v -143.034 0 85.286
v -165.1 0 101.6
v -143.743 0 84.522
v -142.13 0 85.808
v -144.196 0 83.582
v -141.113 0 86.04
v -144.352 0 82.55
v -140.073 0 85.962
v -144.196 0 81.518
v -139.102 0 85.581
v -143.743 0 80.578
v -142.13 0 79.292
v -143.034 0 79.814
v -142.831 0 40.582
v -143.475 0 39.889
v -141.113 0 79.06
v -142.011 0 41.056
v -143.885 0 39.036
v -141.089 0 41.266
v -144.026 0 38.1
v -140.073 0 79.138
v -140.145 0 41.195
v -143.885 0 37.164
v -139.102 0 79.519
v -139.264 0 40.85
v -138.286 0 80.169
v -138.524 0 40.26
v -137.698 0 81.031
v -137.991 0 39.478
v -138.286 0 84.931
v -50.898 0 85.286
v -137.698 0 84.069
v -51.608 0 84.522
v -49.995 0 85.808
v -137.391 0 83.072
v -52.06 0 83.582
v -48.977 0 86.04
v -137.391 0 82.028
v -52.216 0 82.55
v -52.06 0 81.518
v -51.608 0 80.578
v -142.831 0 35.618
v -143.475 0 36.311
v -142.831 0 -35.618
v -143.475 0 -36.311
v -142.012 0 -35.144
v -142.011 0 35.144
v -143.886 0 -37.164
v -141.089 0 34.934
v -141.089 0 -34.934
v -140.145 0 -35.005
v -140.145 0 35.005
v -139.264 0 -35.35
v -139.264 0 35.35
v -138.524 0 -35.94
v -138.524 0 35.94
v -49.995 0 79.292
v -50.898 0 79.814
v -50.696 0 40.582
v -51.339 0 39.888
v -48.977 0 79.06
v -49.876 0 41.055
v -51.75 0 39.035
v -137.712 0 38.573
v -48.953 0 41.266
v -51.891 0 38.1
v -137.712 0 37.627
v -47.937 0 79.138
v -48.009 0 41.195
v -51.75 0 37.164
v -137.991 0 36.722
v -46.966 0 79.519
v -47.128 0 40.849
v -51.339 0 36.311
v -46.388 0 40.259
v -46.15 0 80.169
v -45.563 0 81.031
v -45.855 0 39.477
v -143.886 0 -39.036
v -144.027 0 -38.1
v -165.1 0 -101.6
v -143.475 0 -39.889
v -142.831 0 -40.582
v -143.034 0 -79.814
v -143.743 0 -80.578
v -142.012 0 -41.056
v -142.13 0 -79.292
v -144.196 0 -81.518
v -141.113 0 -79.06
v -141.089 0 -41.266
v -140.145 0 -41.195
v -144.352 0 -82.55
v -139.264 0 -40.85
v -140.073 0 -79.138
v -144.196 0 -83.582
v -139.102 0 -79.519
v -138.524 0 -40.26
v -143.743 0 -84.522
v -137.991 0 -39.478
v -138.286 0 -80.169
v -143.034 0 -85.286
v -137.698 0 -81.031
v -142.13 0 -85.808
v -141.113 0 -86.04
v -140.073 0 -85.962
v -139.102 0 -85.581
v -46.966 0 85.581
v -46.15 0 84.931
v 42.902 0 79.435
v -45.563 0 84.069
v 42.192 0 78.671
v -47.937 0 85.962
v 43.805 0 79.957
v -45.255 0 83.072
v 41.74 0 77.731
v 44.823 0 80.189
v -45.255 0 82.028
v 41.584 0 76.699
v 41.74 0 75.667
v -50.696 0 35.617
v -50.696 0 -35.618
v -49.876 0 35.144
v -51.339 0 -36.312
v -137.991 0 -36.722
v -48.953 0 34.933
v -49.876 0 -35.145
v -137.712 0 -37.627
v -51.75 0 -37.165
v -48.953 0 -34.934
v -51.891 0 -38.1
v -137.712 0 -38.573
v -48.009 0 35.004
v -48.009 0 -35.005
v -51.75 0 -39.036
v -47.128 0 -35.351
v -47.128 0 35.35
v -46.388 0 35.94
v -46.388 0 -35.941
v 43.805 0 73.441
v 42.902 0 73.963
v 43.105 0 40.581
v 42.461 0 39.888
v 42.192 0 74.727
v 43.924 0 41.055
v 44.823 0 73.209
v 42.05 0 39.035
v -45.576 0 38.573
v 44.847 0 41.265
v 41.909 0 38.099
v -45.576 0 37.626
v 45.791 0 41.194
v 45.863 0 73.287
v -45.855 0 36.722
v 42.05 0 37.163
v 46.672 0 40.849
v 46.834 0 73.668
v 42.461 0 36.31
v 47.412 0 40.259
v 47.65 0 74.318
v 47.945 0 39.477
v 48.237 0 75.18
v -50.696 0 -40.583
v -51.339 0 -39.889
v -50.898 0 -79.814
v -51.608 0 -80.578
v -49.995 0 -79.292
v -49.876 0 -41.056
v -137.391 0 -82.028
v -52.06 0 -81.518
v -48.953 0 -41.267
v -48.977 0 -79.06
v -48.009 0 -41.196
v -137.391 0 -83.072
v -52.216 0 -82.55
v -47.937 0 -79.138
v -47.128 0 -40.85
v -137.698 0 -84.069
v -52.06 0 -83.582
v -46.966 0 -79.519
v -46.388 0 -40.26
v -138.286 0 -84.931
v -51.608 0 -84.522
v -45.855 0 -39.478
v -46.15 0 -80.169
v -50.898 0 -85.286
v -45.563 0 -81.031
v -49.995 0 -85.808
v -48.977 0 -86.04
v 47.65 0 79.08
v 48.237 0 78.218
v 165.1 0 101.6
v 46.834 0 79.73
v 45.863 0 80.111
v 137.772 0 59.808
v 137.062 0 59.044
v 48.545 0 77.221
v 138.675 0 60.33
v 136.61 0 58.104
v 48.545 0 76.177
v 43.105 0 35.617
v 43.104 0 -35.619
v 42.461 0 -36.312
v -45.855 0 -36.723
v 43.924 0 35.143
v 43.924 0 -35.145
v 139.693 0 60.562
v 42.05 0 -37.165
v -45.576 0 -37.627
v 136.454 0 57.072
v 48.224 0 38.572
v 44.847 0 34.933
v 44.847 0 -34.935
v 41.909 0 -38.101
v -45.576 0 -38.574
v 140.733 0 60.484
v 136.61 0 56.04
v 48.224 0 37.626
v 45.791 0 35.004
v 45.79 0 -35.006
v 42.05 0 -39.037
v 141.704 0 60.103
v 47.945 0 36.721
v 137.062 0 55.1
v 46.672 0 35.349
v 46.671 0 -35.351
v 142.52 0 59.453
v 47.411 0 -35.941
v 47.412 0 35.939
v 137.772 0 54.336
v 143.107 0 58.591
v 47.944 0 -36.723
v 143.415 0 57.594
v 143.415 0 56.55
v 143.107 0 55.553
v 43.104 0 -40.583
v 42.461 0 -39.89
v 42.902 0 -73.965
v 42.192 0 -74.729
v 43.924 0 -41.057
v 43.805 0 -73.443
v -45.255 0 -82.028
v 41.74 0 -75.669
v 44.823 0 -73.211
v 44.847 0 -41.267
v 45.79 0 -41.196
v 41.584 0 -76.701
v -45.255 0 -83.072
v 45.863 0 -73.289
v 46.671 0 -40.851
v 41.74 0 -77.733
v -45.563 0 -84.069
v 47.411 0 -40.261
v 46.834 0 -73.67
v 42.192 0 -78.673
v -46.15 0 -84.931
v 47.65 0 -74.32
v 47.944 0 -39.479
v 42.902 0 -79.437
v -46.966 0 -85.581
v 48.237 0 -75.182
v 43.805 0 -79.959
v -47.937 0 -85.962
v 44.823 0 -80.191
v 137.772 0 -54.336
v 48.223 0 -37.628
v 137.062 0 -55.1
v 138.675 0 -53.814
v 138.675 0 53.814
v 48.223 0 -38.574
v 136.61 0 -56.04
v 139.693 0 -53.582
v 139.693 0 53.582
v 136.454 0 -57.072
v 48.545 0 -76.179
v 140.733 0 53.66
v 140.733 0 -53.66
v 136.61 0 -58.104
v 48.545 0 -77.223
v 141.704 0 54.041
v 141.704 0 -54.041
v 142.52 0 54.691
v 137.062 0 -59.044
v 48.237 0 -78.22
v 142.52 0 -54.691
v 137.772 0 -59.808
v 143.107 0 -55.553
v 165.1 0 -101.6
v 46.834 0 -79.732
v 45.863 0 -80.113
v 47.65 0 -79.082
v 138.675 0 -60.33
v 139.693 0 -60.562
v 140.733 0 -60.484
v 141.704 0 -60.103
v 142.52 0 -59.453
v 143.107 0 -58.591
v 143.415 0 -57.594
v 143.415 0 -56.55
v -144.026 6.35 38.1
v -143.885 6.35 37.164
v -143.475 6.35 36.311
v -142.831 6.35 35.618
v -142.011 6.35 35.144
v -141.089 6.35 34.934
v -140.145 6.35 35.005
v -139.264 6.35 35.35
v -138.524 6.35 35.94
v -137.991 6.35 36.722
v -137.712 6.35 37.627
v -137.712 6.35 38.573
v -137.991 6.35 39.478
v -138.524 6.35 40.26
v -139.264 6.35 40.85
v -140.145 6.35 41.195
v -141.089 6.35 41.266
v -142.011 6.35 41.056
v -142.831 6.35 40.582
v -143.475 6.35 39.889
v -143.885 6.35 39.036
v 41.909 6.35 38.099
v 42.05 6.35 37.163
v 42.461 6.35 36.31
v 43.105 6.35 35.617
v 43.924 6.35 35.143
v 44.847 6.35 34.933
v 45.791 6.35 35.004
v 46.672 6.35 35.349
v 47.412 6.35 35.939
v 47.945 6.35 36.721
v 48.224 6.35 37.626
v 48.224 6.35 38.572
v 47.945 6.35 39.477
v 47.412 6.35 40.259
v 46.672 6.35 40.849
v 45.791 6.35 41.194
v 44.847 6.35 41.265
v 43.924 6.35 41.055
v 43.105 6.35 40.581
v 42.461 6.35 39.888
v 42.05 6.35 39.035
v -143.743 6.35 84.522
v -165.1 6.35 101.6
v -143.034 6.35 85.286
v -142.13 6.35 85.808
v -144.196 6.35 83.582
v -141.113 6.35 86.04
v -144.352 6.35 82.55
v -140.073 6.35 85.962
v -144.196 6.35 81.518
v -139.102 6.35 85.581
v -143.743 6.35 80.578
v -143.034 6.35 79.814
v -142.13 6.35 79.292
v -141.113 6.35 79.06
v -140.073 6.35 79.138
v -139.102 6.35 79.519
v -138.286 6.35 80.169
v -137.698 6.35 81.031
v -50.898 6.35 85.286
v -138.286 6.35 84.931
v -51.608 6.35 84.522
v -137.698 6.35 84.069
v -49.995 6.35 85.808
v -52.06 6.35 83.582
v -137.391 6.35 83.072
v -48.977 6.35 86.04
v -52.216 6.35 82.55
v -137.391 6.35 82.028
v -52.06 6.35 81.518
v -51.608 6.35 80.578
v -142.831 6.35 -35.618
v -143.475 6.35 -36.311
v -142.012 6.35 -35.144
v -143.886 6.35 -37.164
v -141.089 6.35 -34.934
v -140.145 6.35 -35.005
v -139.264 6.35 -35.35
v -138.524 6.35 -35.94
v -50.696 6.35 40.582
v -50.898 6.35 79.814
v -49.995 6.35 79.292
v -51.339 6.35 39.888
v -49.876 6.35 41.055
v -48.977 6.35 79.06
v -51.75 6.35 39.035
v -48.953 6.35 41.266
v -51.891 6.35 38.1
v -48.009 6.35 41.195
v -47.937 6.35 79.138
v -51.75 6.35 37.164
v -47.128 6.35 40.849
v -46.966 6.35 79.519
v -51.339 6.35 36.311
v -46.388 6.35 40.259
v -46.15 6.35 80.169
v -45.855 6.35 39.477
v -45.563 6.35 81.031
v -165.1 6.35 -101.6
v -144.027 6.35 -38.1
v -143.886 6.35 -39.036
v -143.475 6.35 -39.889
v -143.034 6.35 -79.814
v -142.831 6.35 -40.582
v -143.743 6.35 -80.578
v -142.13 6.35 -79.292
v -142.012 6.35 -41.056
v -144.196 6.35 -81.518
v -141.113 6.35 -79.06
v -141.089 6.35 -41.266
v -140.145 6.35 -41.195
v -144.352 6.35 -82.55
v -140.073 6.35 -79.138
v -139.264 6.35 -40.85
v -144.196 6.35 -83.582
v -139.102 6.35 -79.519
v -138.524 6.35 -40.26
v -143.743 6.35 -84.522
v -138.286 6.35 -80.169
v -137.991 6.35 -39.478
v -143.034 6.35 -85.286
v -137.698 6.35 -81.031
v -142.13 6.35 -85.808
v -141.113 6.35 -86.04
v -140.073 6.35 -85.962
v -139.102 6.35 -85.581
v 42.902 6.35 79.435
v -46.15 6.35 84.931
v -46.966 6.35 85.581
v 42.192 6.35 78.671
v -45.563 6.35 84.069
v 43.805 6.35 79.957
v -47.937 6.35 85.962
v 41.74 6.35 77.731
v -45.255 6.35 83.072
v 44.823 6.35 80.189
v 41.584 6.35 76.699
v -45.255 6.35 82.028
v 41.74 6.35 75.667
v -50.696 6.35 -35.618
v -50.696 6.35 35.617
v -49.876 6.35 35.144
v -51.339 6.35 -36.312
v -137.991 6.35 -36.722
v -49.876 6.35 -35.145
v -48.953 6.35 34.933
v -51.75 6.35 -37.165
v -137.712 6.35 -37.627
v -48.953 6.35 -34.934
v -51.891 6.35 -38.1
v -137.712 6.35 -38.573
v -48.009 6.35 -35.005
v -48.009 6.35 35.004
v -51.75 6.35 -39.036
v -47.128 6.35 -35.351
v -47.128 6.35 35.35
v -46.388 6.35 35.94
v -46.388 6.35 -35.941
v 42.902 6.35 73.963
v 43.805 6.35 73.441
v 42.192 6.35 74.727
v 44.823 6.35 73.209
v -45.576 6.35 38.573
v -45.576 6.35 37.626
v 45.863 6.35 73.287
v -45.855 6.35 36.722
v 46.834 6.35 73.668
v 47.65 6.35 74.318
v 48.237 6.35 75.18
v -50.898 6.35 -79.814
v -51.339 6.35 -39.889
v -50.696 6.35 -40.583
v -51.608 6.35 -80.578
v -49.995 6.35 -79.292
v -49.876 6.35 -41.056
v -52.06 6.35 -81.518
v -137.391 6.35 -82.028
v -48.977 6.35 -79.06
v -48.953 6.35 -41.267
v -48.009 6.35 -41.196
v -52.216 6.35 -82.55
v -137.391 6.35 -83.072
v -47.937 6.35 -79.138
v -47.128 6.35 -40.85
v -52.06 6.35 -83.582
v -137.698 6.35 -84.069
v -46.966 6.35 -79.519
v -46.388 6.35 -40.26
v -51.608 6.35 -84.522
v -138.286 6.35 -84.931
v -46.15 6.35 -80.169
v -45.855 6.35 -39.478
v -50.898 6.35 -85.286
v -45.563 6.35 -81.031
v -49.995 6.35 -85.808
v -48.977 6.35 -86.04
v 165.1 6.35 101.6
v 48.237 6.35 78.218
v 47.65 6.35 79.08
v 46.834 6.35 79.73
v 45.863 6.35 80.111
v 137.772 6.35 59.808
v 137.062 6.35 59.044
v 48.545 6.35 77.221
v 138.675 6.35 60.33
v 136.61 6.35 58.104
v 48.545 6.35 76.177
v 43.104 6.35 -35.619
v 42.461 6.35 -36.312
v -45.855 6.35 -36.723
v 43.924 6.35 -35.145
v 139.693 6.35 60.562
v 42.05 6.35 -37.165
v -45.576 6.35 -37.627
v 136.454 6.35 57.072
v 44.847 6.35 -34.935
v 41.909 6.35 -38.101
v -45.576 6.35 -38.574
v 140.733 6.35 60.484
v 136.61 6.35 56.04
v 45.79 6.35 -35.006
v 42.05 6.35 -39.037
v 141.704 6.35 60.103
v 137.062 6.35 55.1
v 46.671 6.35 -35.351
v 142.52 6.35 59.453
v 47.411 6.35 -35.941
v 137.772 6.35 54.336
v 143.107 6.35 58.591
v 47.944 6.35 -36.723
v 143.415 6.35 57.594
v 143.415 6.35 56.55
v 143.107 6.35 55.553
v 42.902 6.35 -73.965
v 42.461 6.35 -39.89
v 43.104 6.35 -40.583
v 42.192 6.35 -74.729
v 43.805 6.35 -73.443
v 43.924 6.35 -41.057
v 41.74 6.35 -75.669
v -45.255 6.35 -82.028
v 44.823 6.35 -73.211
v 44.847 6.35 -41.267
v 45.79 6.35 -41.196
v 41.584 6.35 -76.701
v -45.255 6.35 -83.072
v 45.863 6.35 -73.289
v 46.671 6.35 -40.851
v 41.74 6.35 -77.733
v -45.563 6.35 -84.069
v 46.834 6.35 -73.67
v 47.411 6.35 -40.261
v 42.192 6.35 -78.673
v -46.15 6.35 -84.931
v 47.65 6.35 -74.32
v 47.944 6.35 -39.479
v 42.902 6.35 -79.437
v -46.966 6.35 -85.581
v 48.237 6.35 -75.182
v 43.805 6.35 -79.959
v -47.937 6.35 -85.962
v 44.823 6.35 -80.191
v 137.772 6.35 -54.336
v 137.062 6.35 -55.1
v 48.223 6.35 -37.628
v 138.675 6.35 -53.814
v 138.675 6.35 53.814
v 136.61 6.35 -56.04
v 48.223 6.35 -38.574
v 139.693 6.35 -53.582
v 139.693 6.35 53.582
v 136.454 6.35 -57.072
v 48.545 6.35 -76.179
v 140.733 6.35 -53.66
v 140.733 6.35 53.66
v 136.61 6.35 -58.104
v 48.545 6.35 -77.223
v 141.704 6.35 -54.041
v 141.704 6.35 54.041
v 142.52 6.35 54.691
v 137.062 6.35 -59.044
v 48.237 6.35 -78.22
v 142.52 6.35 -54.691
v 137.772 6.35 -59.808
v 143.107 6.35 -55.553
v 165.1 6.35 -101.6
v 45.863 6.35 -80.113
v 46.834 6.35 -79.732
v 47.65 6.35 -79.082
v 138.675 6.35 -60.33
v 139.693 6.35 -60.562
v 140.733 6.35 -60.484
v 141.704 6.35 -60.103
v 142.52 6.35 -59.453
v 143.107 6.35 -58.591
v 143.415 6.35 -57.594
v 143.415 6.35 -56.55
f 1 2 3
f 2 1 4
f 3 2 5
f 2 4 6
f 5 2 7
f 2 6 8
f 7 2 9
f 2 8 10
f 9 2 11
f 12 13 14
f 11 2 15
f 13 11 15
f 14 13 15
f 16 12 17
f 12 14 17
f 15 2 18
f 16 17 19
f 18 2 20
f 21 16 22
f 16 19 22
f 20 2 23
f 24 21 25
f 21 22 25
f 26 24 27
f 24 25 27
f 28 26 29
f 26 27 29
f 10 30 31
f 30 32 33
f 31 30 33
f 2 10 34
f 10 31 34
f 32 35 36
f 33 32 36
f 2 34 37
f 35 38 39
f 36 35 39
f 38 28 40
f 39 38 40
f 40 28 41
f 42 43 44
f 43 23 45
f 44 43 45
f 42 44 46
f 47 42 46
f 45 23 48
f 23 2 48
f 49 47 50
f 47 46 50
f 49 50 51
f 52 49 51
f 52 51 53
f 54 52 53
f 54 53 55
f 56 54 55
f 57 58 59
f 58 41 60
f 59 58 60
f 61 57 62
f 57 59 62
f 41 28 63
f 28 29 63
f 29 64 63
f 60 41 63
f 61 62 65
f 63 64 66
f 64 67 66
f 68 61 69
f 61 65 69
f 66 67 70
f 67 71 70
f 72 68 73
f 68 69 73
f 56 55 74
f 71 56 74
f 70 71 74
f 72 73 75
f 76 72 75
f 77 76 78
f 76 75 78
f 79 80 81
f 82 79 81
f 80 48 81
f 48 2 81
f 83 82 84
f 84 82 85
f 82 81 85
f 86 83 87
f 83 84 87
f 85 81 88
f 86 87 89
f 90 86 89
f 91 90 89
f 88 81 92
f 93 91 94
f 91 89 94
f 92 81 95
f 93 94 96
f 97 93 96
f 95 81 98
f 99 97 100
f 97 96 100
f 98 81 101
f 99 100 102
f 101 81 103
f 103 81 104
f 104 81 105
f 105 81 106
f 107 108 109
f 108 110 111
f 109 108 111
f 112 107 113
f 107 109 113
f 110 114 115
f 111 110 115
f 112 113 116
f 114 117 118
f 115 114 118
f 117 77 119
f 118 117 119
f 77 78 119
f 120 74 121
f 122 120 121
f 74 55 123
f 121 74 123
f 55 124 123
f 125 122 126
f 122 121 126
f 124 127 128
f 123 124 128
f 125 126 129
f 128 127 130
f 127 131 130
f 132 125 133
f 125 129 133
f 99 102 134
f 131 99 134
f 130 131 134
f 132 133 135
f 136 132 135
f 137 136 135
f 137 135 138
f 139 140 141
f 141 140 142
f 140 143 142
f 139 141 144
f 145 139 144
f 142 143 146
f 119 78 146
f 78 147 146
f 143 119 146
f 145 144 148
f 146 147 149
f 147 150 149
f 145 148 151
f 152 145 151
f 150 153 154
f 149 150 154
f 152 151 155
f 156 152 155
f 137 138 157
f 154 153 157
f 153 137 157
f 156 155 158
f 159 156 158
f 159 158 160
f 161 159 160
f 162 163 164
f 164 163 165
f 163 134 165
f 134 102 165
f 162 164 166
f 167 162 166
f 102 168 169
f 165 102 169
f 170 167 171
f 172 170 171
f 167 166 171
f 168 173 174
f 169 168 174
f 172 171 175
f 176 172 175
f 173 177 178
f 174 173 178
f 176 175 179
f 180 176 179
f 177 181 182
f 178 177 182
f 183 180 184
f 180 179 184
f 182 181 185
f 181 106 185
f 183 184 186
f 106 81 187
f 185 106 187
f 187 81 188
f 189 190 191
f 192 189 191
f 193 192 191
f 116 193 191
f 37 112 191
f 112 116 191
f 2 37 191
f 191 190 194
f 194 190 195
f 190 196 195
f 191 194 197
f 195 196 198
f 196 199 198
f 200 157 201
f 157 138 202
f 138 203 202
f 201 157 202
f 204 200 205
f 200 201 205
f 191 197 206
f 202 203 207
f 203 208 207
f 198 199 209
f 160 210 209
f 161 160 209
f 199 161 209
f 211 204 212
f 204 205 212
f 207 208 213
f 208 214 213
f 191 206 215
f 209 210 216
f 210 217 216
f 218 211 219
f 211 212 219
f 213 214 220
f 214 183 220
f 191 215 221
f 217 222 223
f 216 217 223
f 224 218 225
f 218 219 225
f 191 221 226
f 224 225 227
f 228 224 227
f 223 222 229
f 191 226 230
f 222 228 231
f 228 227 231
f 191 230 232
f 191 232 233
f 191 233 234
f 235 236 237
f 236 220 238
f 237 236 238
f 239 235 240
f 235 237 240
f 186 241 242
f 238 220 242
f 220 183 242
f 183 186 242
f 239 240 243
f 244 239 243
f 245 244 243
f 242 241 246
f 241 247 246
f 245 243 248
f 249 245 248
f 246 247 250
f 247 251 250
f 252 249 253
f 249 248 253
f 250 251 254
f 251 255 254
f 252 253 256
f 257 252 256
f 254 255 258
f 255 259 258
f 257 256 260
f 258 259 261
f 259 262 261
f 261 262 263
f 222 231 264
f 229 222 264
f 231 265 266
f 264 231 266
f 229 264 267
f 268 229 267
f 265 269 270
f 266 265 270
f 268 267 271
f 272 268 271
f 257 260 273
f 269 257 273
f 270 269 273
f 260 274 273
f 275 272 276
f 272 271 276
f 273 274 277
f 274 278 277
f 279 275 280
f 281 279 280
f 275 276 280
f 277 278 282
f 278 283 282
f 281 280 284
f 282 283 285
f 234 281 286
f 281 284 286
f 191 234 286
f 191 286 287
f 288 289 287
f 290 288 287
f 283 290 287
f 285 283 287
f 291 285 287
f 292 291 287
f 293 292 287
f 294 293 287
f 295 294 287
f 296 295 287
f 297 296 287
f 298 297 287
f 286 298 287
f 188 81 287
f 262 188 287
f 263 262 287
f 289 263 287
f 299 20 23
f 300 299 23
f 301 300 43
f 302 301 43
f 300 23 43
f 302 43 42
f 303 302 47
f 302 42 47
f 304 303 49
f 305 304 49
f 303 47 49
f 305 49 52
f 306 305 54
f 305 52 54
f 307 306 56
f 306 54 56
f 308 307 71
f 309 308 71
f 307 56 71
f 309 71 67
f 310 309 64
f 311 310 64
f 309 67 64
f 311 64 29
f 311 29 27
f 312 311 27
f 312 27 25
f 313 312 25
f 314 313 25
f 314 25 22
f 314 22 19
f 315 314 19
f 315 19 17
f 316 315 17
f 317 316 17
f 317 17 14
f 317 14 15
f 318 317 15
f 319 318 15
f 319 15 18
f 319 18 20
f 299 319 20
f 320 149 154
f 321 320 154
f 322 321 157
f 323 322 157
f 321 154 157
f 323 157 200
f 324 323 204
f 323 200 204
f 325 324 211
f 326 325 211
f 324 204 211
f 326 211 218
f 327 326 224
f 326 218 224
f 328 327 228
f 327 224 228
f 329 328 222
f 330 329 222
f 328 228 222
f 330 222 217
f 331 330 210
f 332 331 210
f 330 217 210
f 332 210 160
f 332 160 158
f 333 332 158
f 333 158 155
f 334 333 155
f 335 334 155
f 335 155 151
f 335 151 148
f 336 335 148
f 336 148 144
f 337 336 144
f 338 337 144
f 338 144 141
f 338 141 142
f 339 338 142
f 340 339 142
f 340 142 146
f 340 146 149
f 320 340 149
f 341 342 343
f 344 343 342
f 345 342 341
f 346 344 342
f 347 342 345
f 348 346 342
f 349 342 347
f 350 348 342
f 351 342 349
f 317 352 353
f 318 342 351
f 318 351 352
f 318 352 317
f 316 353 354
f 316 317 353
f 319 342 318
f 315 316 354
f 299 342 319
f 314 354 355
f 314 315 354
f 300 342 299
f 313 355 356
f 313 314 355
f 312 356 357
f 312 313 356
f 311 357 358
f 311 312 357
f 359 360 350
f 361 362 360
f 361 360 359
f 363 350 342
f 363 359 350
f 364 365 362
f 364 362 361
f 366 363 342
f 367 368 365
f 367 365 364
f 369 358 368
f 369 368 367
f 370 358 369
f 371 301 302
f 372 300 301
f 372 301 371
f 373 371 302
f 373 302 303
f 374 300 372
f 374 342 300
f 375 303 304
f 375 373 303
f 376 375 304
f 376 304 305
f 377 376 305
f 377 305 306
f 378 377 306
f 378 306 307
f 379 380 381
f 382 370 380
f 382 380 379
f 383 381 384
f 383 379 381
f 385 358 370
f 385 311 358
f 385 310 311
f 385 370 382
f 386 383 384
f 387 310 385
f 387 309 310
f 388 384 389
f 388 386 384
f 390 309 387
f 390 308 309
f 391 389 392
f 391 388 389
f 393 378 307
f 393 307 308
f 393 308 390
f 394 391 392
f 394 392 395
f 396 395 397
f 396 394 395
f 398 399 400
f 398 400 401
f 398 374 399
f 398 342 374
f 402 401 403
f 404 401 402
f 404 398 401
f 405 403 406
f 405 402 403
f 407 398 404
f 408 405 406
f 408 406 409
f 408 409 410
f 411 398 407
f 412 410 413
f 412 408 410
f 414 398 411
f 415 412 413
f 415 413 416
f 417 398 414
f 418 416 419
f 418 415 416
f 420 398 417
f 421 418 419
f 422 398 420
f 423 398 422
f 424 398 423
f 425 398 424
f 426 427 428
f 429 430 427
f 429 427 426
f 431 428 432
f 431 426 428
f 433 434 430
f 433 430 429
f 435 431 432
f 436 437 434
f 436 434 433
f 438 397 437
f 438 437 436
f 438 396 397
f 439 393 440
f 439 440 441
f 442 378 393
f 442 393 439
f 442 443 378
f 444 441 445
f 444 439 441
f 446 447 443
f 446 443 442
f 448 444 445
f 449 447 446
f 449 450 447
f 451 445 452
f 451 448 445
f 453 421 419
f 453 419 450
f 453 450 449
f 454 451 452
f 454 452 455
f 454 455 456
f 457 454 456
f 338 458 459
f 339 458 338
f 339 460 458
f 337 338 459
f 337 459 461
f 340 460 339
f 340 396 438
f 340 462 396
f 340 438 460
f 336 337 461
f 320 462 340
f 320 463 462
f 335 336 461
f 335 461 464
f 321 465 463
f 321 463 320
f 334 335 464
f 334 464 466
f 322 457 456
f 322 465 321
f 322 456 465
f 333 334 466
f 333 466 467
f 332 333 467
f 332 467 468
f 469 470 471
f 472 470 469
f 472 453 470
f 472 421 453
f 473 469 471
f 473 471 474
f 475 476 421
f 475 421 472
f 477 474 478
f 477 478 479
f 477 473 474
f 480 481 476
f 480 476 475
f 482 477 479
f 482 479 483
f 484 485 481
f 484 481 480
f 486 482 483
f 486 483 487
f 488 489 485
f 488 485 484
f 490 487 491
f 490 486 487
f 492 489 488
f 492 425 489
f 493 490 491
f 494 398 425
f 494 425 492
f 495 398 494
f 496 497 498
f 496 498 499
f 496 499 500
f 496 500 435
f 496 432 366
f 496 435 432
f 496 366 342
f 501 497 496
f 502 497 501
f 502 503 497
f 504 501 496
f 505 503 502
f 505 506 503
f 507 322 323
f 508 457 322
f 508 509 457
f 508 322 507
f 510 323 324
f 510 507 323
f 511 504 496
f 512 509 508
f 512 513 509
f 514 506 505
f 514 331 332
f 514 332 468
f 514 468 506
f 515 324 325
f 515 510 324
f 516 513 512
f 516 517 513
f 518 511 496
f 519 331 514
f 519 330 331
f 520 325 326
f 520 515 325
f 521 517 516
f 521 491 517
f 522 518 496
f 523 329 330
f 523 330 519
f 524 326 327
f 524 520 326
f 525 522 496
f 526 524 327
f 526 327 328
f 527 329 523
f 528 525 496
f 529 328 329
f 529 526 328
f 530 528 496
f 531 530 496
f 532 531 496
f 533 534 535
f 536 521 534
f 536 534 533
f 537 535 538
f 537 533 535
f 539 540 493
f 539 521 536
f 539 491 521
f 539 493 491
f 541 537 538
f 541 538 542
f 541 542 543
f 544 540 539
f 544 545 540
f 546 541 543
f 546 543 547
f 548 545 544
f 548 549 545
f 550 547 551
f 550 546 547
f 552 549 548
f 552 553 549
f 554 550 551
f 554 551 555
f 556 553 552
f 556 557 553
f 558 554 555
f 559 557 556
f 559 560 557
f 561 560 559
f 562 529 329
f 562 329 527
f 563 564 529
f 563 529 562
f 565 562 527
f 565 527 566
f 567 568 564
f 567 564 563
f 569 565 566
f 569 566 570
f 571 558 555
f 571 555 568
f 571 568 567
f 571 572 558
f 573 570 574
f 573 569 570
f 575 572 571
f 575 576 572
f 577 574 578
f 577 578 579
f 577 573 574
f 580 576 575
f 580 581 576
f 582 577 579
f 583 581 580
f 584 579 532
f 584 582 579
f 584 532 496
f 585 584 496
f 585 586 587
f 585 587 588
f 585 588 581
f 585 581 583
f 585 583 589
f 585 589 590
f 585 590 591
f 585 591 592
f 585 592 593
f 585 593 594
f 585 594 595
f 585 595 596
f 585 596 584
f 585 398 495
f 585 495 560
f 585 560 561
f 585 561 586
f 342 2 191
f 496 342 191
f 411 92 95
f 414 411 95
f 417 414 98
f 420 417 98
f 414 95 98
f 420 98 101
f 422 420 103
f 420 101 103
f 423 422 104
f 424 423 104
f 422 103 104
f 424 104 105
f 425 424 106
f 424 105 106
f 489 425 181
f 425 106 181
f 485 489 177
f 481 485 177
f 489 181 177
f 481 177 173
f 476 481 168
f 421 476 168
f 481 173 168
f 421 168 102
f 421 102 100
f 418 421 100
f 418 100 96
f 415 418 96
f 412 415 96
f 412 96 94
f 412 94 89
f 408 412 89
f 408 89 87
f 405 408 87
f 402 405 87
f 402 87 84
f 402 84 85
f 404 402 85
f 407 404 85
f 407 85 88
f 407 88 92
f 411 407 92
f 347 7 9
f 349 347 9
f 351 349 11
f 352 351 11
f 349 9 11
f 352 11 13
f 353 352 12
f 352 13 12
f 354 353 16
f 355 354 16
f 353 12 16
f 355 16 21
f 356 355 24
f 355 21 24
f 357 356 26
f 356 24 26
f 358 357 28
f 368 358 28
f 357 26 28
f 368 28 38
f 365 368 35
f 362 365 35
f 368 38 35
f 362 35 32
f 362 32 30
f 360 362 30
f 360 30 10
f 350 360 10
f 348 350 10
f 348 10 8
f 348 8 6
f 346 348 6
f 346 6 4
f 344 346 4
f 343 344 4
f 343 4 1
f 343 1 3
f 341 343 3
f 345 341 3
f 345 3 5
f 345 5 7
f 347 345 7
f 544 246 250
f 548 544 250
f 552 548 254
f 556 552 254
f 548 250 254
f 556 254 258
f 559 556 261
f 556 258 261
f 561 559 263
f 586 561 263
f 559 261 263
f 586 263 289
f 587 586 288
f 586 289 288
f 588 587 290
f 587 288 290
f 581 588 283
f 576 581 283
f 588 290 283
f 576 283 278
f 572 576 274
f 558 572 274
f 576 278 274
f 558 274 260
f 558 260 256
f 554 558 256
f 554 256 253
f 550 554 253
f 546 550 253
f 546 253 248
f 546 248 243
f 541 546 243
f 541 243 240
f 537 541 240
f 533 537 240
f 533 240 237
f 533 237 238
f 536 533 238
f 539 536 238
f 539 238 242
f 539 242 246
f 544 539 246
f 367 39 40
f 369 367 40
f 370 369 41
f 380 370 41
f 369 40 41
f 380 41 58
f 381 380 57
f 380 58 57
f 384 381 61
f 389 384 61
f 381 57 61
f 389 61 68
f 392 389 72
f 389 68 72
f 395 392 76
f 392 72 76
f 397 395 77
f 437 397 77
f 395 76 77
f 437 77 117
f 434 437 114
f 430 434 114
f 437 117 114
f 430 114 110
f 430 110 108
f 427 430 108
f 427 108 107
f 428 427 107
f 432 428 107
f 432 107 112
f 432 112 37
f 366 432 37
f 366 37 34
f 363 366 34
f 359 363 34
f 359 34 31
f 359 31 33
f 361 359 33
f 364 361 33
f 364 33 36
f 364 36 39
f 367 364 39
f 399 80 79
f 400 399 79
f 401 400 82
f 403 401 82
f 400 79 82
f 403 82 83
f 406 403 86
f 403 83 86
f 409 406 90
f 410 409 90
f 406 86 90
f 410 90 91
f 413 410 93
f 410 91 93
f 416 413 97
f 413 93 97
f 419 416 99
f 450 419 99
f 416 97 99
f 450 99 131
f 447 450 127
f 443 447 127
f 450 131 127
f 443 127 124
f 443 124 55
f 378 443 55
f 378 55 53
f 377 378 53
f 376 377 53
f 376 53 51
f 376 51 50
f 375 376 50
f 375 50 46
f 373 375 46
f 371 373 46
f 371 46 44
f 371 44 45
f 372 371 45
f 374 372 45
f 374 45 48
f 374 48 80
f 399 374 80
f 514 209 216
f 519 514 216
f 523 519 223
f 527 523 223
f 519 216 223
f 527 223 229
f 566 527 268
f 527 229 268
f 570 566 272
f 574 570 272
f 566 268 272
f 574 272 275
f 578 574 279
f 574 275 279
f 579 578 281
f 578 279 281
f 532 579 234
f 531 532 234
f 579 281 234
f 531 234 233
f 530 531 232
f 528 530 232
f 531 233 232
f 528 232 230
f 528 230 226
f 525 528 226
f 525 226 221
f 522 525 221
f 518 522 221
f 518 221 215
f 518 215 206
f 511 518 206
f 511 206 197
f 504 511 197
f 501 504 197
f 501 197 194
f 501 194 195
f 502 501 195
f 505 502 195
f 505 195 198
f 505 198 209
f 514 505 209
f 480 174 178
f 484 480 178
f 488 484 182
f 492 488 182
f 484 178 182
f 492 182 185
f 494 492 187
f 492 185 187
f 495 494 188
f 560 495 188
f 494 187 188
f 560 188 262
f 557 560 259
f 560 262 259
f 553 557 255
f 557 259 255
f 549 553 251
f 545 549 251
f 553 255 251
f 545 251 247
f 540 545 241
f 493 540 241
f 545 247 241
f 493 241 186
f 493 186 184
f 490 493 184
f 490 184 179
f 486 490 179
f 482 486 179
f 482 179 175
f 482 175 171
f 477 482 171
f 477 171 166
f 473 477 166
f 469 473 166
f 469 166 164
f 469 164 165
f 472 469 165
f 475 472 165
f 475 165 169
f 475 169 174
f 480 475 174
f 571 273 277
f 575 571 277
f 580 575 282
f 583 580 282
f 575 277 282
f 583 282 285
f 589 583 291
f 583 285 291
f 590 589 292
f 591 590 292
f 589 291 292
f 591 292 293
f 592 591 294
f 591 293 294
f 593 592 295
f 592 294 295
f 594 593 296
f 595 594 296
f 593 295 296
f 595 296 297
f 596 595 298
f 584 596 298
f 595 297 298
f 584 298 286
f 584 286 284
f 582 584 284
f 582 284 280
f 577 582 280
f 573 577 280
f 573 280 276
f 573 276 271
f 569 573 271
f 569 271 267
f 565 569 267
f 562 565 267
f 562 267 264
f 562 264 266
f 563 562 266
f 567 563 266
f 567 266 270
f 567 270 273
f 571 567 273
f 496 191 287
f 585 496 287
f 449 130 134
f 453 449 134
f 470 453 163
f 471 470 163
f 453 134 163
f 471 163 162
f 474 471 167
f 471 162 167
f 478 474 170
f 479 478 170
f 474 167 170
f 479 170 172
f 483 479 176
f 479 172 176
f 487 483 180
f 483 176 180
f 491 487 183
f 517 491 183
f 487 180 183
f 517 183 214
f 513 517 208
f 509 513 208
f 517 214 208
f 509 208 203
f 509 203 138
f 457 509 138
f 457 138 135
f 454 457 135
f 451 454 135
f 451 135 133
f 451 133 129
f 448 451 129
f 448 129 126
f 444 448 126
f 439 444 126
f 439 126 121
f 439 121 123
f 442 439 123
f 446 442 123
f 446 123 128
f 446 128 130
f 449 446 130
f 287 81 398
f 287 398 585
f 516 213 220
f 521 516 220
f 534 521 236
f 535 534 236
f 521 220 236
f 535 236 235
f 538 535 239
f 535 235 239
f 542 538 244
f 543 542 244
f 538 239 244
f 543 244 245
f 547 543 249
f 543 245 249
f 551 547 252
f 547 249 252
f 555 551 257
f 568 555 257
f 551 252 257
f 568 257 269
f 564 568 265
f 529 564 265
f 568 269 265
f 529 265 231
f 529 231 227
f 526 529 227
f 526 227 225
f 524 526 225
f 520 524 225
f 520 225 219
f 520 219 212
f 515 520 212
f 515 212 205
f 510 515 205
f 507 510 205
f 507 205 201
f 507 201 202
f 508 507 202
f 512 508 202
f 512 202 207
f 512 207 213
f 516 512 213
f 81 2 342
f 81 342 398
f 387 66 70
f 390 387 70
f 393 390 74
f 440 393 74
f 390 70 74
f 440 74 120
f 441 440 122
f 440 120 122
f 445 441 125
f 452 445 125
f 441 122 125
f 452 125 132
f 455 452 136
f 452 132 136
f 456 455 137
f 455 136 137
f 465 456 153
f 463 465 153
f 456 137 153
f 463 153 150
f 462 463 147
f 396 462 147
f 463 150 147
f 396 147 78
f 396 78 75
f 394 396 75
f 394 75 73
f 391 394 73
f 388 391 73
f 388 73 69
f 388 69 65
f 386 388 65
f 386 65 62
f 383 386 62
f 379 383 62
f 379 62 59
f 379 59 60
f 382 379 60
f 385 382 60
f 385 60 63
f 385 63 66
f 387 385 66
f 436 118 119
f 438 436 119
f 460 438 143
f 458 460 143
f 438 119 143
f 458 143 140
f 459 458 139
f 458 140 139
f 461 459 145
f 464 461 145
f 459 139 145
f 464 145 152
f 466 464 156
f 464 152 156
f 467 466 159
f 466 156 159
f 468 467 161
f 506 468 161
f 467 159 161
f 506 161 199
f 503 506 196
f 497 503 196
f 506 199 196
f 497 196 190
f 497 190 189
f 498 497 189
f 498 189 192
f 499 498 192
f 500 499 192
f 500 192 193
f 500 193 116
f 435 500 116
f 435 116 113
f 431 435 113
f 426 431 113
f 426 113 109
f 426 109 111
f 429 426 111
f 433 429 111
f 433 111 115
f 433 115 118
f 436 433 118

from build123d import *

# Parameters (mm, degrees)
SKETCH1_W                      = 330.2
SKETCH1_H                      = 203.2
BOSS_EXTRUDE1_DEPTH            = 6.35
F_1_4_0_25_PRESS_DOWEL_HOLE1_D = 6.35
M8X1_0_TAPPED_HOLE1_D          = 7


with BuildPart() as part:
    # Sketch1 → Boss-Extrude1 (new body)
    with BuildSketch(Plane(origin=(0, 0, 0), x_dir=(1, 0, 0), z_dir=(0, 1, 0))):
        Rectangle(SKETCH1_W, SKETCH1_H)
    extrude(amount=BOSS_EXTRUDE1_DEPTH)

    # 1/4 (0.25) Press Dowel Hole1 (through all)
    with Locations(Plane(origin=(0, 6.35, 0), x_dir=(1, 0, 0), z_dir=(0, 1, 0))):
        with Locations((-140.85176751, 38.099999999), (-140.851357678, -38.099999999), (-48.715925188, -38.099504462), (-48.715925188, 38.100495539), (45.083869896, 38.101000028), (45.084279728, -38.098999971)):
            Hole(F_1_4_0_25_PRESS_DOWEL_HOLE1_D / 2)

    # M8x1.0 Tapped Hole1 (through all)
    with Locations(Plane(origin=(0, 6.35, 0), x_dir=(1, 0, 0), z_dir=(0, 1, 0))):
        with Locations((-140.851562594, 82.55), (-48.715925188, 82.55), (45.084074812, 76.701000029), (45.084074812, -76.698999971), (-48.715925188, -82.55), (-140.851562594, -82.55), (139.954074812, 57.072042721), (139.954074812, -57.072042721)):
            Hole(M8X1_0_TAPPED_HOLE1_D / 2)


solid = part.part
